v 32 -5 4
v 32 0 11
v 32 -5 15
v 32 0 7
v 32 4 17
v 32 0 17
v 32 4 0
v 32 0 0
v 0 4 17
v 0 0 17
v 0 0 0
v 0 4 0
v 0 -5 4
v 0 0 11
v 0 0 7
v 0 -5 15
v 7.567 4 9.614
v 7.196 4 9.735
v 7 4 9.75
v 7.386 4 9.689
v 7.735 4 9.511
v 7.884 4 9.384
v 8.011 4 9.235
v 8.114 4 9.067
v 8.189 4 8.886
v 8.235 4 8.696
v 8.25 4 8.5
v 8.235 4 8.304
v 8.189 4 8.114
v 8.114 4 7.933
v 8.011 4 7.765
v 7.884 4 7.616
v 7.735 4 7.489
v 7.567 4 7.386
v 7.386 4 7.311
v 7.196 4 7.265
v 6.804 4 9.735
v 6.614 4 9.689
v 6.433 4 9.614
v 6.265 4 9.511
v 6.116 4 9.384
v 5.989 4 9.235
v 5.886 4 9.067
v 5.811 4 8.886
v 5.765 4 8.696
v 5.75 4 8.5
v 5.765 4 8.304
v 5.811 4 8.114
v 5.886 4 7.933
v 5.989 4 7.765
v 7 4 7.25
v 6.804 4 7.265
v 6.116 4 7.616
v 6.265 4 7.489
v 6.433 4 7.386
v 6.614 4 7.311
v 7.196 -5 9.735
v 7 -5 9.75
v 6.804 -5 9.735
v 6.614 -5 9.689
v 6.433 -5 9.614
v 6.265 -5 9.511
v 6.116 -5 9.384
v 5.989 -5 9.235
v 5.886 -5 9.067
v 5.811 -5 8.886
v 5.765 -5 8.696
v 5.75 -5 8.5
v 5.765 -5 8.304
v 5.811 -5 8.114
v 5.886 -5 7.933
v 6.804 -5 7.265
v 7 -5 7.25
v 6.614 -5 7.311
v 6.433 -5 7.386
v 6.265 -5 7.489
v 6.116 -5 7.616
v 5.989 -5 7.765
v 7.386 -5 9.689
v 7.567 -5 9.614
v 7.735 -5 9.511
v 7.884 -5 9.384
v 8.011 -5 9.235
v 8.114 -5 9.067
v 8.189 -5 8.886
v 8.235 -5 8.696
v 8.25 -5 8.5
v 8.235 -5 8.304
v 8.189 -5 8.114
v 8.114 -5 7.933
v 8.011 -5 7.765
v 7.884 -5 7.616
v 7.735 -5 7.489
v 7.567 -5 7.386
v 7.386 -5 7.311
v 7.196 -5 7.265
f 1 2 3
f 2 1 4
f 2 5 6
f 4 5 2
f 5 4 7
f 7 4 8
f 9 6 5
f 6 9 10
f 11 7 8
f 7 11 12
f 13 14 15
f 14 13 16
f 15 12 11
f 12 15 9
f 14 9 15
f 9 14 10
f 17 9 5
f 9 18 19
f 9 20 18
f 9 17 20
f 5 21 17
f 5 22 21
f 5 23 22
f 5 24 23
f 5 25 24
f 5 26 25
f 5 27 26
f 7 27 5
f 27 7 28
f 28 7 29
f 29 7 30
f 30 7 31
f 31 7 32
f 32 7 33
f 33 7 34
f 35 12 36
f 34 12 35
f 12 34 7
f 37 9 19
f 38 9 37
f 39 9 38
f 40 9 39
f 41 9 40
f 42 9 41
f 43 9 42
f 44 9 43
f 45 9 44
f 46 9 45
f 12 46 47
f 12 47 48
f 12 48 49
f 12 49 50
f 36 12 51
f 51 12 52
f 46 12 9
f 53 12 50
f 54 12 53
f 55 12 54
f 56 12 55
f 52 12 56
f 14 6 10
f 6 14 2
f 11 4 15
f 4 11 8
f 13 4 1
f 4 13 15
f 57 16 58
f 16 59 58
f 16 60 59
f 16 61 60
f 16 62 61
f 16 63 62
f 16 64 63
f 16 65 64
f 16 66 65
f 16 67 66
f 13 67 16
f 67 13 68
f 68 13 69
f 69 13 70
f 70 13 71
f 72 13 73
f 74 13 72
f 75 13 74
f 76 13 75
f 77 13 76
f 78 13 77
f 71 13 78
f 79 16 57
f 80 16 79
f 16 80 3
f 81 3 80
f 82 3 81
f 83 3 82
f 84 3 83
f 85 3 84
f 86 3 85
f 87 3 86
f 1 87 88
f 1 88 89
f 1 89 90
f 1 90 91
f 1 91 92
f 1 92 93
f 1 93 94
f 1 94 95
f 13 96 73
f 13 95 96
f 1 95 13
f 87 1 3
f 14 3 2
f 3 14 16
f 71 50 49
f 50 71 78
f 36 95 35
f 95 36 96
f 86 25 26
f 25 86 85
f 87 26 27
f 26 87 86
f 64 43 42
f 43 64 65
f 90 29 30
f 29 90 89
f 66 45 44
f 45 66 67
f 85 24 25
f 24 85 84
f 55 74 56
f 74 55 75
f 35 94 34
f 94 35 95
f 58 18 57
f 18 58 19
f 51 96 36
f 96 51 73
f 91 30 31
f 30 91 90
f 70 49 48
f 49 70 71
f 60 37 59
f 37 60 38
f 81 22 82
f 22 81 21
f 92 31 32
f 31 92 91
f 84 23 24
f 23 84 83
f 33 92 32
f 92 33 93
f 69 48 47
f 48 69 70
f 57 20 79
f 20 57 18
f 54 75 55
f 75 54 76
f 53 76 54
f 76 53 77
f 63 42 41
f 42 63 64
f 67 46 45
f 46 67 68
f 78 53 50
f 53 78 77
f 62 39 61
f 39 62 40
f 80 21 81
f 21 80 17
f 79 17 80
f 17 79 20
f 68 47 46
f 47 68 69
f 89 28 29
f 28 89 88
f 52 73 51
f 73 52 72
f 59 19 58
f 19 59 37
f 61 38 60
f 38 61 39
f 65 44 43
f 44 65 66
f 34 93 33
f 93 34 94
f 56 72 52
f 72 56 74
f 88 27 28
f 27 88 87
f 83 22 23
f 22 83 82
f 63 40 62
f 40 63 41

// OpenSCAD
 
$fn = 40;
 
difference () {
    union () {
        cube ( size = [32,4,17]);
        translate ([0,-5,15]) rotate ([0,90,0]) linear_extrude(height = 32, convexity = 10) polygon (points = [[0,0],[4,5],[8,5],[11,0]], paths = [[0,1,2,3]]);
    }
    union () {
        translate ([7,4+1,17/2]) rotate ([90,0,0]) cylinder ( h = 4+5+2, r = 2.5/2 );
    }
}
